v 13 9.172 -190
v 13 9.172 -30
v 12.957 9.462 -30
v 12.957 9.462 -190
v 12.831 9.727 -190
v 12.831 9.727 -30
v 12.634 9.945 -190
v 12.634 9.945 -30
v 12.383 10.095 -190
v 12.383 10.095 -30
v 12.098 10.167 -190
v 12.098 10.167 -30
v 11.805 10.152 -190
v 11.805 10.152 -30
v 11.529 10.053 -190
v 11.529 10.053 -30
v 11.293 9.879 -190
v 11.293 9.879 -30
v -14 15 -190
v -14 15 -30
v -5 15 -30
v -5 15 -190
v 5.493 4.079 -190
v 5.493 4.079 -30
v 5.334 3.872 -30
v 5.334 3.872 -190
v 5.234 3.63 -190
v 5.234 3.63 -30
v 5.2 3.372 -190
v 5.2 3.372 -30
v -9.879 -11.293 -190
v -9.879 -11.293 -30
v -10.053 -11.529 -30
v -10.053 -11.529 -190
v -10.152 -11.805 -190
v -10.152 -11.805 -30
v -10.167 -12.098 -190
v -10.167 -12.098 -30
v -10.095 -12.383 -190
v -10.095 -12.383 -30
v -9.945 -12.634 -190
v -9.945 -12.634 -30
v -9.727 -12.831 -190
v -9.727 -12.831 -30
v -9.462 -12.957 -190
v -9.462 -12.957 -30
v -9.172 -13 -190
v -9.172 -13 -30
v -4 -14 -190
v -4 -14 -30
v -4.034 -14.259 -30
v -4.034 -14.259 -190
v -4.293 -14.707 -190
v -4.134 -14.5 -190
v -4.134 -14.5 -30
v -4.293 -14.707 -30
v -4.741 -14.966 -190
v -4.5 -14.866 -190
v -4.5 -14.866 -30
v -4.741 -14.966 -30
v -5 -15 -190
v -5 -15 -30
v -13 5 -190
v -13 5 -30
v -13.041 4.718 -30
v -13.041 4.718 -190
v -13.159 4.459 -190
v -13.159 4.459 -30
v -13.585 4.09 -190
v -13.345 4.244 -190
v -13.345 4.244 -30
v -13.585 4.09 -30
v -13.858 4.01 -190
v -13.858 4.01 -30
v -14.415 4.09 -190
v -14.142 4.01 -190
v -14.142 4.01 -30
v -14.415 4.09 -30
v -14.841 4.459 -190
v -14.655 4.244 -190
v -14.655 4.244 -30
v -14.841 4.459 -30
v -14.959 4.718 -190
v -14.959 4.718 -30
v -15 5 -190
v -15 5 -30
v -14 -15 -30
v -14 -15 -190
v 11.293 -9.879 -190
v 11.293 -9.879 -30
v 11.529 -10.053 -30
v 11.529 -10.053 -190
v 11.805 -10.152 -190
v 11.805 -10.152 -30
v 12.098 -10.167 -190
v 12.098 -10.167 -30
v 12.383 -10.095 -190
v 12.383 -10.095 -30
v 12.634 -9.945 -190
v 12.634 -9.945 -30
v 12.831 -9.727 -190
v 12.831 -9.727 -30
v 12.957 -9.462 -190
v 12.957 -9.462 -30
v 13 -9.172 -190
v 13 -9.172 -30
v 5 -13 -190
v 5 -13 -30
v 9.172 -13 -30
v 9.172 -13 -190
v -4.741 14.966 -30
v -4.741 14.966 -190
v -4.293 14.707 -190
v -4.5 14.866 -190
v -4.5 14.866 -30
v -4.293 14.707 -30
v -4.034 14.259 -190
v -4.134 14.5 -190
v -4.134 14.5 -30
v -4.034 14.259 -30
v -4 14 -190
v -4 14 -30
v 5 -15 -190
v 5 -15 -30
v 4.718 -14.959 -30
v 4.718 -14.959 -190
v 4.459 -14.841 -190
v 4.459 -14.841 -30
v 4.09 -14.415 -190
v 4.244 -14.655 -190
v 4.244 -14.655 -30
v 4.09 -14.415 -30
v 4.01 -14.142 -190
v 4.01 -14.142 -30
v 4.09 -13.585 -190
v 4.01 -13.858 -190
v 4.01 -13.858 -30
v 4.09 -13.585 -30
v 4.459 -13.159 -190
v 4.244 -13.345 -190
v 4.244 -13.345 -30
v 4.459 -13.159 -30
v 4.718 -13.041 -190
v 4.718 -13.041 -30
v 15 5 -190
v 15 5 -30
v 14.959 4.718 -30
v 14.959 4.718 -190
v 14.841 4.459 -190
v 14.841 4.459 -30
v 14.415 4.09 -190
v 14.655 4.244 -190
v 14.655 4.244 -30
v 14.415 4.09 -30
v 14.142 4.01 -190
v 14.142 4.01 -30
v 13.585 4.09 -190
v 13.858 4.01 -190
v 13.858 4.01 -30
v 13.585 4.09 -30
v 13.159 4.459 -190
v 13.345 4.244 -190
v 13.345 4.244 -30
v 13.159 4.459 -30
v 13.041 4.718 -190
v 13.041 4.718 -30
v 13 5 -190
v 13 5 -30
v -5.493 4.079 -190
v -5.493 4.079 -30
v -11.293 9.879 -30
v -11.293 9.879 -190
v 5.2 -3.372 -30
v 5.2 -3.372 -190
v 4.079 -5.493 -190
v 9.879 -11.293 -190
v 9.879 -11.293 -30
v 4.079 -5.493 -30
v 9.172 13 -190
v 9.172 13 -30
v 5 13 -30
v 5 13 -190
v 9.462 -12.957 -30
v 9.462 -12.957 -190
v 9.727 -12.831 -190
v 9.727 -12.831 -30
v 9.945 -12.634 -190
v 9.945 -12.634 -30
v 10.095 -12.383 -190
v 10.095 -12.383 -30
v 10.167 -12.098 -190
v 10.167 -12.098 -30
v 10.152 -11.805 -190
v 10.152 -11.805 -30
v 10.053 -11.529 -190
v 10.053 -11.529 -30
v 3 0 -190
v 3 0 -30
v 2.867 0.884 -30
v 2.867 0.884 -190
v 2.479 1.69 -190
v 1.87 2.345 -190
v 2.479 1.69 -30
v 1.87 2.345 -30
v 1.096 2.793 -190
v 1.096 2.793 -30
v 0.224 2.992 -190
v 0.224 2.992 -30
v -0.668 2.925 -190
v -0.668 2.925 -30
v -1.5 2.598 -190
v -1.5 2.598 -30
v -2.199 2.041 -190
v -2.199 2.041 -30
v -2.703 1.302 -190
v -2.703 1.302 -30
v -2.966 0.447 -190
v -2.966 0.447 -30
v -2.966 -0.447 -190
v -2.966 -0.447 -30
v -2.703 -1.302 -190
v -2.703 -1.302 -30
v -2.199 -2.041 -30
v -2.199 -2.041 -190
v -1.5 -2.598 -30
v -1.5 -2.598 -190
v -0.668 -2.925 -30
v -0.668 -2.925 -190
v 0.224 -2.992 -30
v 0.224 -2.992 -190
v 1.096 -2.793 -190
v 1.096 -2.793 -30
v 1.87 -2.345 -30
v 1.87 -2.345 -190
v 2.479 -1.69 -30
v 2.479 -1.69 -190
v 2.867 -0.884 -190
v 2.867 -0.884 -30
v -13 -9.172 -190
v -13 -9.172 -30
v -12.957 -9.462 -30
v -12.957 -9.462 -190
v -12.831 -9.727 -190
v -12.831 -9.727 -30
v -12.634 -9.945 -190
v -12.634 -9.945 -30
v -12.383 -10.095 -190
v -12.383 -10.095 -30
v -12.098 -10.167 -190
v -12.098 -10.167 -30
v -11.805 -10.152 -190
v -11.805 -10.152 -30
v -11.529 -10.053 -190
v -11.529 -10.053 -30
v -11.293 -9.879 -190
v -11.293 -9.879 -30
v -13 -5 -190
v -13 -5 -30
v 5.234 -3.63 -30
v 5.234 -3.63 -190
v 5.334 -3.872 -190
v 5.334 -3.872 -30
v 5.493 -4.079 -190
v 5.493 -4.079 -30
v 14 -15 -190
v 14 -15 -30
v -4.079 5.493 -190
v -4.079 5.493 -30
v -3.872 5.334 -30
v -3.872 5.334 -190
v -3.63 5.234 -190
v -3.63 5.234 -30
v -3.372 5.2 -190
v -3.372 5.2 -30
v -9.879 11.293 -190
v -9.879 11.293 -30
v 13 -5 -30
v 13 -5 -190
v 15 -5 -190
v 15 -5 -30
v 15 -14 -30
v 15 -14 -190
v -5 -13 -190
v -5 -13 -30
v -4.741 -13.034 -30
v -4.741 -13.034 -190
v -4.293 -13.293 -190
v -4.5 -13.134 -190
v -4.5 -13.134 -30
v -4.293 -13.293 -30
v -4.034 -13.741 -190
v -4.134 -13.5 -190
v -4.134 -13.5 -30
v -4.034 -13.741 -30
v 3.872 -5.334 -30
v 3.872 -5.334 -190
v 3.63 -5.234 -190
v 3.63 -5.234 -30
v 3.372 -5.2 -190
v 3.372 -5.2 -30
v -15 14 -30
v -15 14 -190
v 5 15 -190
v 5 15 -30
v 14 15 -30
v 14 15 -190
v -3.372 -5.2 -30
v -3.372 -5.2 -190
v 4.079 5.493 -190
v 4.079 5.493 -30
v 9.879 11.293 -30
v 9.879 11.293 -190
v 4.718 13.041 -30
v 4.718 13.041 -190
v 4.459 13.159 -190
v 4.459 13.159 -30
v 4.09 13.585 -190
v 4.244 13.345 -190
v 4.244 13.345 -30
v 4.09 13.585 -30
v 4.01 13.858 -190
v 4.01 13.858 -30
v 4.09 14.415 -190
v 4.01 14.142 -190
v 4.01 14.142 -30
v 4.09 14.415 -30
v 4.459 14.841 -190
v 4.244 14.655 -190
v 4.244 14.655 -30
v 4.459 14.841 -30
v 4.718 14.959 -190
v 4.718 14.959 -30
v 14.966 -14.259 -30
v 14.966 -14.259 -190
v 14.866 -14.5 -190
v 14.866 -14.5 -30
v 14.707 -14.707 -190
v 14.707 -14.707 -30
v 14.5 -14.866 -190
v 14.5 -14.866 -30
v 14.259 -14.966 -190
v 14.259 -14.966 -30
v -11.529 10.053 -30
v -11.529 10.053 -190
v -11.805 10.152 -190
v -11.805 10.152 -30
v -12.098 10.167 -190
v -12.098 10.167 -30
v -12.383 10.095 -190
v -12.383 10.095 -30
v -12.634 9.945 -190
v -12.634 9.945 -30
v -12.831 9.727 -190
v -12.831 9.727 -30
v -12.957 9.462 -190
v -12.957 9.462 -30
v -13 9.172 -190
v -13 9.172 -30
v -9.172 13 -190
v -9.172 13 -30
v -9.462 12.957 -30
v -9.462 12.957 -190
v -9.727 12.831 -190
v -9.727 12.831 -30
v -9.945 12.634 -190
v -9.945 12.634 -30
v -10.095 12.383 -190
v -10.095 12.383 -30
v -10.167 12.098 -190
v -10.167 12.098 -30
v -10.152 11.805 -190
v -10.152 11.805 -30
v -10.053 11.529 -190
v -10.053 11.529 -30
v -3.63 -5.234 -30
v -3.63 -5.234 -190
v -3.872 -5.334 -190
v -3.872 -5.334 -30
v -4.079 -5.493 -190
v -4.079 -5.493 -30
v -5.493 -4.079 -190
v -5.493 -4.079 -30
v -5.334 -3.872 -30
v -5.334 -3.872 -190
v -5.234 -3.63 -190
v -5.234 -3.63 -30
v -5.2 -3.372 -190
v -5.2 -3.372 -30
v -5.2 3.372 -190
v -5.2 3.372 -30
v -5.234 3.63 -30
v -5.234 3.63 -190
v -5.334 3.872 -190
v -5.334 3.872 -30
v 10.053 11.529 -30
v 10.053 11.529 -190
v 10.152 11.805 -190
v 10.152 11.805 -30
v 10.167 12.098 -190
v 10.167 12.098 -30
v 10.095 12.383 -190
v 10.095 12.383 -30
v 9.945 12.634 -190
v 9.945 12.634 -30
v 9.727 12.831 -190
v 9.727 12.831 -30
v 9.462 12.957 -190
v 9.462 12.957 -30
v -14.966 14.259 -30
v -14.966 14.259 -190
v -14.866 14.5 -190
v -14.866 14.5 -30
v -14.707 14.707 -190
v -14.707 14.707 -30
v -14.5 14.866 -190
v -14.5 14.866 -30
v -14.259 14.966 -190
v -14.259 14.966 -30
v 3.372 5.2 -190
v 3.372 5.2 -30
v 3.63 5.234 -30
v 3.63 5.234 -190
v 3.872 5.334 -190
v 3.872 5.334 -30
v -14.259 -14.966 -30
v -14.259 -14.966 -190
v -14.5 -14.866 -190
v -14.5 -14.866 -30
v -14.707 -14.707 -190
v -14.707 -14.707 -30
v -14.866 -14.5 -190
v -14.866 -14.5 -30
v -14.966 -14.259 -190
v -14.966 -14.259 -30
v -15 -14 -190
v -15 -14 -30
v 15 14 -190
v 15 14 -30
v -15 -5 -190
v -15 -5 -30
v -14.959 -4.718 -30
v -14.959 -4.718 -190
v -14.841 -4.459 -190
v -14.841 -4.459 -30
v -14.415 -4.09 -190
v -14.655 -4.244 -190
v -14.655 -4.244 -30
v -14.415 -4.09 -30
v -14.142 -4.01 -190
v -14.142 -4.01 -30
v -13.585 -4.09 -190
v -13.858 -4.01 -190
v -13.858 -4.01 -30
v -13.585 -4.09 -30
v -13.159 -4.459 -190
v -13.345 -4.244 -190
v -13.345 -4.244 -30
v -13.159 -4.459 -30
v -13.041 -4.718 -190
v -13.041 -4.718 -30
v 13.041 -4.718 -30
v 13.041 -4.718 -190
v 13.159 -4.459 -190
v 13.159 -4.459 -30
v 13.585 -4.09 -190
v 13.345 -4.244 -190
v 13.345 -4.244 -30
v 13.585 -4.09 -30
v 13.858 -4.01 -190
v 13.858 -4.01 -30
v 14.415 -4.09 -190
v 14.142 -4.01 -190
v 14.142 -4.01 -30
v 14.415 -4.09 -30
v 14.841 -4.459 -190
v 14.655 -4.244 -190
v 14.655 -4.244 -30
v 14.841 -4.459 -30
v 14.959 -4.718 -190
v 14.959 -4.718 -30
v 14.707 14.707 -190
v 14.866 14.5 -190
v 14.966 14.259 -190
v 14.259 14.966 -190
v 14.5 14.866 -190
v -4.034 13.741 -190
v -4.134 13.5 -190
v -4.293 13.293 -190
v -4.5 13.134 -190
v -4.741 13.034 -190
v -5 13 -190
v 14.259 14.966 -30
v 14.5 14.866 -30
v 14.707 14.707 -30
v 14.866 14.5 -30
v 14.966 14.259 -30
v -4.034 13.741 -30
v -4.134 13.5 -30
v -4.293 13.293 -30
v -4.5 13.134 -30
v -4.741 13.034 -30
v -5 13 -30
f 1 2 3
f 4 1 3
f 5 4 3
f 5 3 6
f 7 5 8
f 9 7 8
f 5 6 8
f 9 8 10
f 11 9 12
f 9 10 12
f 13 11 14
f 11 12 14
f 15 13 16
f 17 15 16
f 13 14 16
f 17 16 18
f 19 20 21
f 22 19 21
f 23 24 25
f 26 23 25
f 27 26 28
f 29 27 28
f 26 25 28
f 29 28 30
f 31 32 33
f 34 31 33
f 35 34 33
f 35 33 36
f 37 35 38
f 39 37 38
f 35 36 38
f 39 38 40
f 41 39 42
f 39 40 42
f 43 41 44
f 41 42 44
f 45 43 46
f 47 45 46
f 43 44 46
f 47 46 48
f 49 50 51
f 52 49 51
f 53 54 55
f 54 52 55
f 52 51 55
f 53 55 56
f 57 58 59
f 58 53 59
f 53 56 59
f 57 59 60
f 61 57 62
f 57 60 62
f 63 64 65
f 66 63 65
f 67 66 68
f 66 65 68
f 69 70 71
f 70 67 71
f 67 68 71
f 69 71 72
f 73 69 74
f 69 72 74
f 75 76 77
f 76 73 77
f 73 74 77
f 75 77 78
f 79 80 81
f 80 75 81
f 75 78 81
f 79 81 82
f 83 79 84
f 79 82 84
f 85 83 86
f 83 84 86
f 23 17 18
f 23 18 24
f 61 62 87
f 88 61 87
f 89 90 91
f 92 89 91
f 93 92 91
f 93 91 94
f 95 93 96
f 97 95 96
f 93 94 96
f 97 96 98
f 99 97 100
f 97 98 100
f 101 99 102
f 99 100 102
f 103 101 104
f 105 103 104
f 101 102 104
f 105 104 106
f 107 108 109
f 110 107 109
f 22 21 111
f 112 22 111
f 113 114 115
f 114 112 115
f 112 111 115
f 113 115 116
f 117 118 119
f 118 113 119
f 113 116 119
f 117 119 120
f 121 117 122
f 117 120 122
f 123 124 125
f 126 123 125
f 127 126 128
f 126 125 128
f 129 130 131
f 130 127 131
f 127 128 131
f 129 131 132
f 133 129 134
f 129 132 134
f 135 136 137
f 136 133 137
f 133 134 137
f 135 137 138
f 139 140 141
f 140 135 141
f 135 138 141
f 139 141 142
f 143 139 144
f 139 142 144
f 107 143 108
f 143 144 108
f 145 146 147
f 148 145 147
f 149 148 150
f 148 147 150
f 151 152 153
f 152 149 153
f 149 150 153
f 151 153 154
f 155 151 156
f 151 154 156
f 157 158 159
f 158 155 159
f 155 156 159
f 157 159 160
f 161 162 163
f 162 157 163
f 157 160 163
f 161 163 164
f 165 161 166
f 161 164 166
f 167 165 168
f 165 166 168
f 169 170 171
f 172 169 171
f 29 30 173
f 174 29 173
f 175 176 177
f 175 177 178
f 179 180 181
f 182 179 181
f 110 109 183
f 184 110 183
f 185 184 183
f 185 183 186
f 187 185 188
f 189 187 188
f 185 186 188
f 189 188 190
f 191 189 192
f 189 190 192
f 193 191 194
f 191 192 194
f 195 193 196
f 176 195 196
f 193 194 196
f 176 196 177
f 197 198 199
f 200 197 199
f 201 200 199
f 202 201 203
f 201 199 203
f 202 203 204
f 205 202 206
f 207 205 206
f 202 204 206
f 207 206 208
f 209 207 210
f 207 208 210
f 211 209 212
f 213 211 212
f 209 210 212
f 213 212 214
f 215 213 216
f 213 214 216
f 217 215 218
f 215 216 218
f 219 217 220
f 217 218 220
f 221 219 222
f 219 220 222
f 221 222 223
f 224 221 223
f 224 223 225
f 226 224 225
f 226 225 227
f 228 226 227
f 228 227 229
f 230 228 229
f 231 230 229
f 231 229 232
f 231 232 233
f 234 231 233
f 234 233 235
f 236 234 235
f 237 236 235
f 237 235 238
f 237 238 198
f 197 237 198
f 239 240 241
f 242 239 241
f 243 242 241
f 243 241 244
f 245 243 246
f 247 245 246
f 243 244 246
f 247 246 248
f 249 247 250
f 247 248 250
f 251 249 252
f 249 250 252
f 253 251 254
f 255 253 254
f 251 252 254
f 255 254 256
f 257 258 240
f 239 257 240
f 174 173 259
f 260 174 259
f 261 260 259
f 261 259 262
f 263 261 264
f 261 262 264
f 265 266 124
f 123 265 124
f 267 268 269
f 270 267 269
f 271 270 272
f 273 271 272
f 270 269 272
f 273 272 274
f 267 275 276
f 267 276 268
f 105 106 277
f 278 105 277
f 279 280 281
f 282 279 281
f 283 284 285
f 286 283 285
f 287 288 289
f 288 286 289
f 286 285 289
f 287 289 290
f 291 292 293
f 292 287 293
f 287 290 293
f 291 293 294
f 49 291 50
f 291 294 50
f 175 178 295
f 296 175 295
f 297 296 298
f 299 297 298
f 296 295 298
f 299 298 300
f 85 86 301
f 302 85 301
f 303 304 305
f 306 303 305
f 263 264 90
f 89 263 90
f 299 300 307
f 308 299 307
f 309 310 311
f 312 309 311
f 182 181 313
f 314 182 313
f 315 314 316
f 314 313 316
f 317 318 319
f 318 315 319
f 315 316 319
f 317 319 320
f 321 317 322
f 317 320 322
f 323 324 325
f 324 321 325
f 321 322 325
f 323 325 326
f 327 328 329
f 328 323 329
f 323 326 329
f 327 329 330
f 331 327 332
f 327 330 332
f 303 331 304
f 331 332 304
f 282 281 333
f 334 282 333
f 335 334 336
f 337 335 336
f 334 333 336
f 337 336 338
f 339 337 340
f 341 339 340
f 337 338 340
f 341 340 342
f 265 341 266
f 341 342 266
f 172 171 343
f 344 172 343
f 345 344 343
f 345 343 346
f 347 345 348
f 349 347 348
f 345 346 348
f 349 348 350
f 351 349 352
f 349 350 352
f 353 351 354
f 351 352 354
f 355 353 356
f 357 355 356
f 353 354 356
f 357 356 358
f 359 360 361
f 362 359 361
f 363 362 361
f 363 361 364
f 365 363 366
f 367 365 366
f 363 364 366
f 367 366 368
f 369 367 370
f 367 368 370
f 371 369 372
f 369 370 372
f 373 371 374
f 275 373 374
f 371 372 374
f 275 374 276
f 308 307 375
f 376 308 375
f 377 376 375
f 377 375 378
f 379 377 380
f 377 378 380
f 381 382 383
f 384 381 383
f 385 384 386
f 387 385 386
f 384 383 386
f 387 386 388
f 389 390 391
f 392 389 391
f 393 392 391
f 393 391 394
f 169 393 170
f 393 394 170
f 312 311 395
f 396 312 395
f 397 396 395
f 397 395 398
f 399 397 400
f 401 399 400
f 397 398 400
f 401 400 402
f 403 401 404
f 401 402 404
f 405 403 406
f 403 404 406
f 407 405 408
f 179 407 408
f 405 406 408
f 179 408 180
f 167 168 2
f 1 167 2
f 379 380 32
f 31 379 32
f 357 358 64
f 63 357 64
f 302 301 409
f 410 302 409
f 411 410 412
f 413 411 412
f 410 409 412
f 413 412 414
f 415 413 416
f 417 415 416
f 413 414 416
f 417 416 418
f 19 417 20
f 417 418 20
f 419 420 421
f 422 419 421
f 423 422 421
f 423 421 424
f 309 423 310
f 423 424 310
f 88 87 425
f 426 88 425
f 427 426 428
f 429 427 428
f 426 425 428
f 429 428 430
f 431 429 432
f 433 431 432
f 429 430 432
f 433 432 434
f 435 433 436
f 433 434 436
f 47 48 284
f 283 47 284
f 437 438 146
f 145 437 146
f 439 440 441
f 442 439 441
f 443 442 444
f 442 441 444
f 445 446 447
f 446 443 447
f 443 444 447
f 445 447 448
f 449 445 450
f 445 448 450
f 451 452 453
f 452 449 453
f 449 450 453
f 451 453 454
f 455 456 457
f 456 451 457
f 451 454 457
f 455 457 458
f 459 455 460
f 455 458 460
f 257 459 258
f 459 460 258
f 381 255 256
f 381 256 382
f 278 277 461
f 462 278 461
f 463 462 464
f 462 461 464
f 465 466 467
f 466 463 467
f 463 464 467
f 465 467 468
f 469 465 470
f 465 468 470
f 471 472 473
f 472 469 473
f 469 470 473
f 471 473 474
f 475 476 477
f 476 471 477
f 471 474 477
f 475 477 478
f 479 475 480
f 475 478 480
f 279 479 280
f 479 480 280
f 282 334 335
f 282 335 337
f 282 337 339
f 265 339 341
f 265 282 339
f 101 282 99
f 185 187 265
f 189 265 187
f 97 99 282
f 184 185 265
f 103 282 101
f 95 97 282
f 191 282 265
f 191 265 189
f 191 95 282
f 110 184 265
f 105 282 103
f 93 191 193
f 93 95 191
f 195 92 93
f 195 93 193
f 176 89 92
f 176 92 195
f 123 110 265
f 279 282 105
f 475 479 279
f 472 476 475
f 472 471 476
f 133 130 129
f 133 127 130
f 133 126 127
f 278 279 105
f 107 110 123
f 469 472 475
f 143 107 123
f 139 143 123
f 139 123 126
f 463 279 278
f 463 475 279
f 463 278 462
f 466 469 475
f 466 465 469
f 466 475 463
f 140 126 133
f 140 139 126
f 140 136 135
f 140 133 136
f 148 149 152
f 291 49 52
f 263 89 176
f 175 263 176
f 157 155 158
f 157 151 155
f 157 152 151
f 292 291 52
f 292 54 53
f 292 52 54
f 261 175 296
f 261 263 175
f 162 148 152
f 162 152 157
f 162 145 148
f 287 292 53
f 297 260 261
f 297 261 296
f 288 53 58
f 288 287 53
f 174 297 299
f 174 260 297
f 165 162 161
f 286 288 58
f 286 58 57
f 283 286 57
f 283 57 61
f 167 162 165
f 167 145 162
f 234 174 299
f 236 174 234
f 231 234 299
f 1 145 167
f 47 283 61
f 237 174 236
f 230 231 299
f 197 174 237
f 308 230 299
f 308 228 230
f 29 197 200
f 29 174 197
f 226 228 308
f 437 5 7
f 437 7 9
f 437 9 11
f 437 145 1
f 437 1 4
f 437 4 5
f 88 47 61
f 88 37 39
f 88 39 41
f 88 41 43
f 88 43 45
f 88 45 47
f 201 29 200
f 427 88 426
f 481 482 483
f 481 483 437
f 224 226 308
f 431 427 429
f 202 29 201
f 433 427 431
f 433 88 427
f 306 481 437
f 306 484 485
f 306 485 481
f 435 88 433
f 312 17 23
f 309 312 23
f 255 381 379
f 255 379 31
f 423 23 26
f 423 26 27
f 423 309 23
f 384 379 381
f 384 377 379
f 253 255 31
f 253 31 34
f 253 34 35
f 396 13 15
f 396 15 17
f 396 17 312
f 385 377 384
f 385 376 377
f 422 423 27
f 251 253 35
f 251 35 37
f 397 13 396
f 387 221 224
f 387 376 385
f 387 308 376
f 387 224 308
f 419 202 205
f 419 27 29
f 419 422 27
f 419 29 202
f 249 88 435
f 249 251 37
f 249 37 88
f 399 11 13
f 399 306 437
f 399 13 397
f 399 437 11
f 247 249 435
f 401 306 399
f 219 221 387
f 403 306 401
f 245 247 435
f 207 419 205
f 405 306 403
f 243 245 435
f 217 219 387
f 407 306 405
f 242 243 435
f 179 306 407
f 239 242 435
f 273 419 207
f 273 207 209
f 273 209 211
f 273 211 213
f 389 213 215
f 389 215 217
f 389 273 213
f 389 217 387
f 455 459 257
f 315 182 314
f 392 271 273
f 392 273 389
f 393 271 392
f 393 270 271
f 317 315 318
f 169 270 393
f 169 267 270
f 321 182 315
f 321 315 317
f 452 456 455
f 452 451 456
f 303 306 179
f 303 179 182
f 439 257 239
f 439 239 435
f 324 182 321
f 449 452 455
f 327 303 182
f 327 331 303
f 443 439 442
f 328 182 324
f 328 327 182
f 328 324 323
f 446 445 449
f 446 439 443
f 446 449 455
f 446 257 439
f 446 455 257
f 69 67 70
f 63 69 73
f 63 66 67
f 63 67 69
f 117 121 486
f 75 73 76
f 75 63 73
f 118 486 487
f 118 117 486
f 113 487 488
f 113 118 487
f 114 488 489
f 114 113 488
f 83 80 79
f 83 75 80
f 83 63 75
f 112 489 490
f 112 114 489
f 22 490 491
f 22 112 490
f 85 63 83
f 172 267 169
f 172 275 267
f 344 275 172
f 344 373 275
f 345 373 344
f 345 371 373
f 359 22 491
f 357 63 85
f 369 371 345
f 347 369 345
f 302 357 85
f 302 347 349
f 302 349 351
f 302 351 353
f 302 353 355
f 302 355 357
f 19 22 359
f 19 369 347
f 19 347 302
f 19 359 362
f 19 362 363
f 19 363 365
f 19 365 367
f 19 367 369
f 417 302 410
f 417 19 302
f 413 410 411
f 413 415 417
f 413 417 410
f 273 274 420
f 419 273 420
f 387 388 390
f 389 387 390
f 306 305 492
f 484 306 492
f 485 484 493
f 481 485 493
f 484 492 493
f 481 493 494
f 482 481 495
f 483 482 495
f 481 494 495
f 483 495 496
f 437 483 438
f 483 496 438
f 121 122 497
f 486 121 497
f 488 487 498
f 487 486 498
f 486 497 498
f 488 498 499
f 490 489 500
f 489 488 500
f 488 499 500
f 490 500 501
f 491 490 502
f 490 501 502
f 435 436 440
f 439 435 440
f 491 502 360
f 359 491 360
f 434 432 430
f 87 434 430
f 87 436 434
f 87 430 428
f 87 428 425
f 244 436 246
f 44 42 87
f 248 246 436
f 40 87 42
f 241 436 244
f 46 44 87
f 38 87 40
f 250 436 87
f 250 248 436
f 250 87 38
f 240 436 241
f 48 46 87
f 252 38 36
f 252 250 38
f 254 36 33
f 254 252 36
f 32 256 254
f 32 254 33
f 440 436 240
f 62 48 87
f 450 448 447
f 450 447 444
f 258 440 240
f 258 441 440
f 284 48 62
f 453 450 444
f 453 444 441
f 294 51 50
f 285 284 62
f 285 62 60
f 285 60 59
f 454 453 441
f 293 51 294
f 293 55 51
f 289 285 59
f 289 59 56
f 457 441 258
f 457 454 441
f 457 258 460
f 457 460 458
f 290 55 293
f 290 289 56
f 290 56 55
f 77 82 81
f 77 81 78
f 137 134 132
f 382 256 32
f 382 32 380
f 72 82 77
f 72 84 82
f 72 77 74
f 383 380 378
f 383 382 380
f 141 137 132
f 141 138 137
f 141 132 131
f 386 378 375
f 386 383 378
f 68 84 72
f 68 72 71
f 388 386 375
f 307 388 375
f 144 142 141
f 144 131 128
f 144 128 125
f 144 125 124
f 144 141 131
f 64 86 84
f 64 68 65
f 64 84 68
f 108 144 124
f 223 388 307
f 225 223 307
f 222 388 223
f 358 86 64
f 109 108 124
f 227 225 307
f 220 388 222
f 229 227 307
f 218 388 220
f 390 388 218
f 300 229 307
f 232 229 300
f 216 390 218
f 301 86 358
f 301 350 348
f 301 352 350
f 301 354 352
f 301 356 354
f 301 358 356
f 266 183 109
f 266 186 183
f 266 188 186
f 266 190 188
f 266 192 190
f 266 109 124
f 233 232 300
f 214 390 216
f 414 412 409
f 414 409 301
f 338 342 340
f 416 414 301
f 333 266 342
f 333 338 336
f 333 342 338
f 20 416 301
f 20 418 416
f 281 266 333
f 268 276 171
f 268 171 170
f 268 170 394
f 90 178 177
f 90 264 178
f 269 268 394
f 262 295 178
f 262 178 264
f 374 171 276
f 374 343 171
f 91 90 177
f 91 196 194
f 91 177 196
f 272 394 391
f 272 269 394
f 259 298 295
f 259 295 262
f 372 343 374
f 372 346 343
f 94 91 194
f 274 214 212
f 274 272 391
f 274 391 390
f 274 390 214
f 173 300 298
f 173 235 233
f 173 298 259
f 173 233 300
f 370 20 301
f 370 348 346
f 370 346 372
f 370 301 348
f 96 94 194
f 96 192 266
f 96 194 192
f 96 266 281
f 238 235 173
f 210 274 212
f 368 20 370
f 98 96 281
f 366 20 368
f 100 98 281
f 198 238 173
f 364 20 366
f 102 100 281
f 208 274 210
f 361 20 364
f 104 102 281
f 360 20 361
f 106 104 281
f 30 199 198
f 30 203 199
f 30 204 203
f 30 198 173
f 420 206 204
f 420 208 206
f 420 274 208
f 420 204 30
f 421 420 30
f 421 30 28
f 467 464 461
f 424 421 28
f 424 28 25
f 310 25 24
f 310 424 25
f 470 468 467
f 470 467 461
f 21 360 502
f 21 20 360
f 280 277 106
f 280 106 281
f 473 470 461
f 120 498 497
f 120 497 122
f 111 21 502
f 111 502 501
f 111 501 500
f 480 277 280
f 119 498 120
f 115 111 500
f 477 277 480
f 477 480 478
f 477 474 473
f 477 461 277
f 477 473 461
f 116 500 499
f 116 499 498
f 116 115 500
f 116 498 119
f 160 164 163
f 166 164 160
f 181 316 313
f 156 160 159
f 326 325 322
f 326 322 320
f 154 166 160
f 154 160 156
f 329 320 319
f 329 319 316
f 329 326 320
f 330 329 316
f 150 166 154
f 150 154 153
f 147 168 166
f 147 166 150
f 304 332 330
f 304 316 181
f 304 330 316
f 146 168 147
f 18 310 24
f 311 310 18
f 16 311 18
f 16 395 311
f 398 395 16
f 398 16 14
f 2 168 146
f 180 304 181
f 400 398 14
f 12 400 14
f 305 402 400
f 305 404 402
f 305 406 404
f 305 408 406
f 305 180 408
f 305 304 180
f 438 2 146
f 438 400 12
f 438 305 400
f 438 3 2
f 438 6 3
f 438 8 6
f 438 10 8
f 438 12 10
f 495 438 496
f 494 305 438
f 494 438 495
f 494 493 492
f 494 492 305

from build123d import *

# Parameters (mm, degrees)
SALIENTE_EXTRUIR1_DEPTH = 190
CROQUIS2_R              = 3
CORTAR_EXTRUIR1_DEPTH   = 192.180542943
CORTAR_EXTRUIR3_DEPTH   = 192.180542943
CROQUIS4_W              = 33.127581221
CROQUIS4_H              = 30
CORTAR_EXTRUIR4_DEPTH   = 38


with BuildPart() as part:
    # Croquis1 → Saliente-Extruir1 (new body)
    with BuildSketch(Plane.XY):
        with BuildLine():
            Line((-14, 15), (14, 15))
            ThreePointArc((14, 15), (14.707106781, 14.707106781), (15, 14))
            Line((15, 14), (15, -14))
            ThreePointArc((15, -14), (14.707106781, -14.707106781), (14, -15))
            Line((14, -15), (-14, -15))
            ThreePointArc((-14, -15), (-14.707106781, -14.707106781), (-15, -14))
            Line((-15, -14), (-15, 14))
            ThreePointArc((-15, 14), (-14.707106781, 14.707106781), (-14, 15))
        make_face()
    extrude(amount=-SALIENTE_EXTRUIR1_DEPTH)

    # Croquis2 → Cortar-Extruir1 (cut, through all)
    with BuildSketch(Plane.XY):
        Circle(CROQUIS2_R)
    extrude(amount=-CORTAR_EXTRUIR1_DEPTH, mode=Mode.SUBTRACT)

    # Croquis3 → Cortar-Extruir3 (cut, through all)
    with BuildSketch(Plane.XY):
        with BuildLine():
            Line((-5.492893219, 4.078679656), (-11.292893219, 9.878679656))
            ThreePointArc((-11.292893219, 9.878679656), (-12.382683432, 10.095452408), (-13, 9.171572875))
            Line((-13, 9.171572875), (-13, 5))
            ThreePointArc((-13, 5), (-14, 4), (-15, 5))
            Line((-15, 5), (-15, -5))
            ThreePointArc((-15, -5), (-14, -4), (-13, -5))
            Line((-13, -5), (-13, -9.171572875))
            ThreePointArc((-13, -9.171572875), (-12.382683432, -10.095452408), (-11.292893219, -9.878679656))
            Line((-11.292893219, -9.878679656), (-5.492893219, -4.078679656))
            ThreePointArc((-5.492893219, -4.078679656), (-5.276120467, -3.754256308), (-5.2, -3.371572875))
            Line((-5.2, -3.371572875), (-5.2, 3.371572875))
            ThreePointArc((-5.2, 3.371572875), (-5.276120467, 3.754256308), (-5.492893219, 4.078679656))
        make_face()
        with BuildLine():
            ThreePointArc((-9.171572875, 13), (-10.095452408, 12.382683432), (-9.878679656, 11.292893219))
            Line((-9.878679656, 11.292893219), (-4.078679656, 5.492893219))
            ThreePointArc((-4.078679656, 5.492893219), (-3.754256308, 5.276120467), (-3.371572875, 5.2))
            Line((-3.371572875, 5.2), (3.371572875, 5.2))
            ThreePointArc((3.371572875, 5.2), (3.754256308, 5.276120467), (4.078679656, 5.492893219))
            Line((4.078679656, 5.492893219), (9.878679656, 11.292893219))
            ThreePointArc((9.878679656, 11.292893219), (10.095452408, 12.382683432), (9.171572875, 13))
            Line((9.171572875, 13), (5, 13))
            ThreePointArc((5, 13), (4, 14), (5, 15))
            Line((5, 15), (-5, 15))
            ThreePointArc((-5, 15), (-4.292893219, 14.707106781), (-4, 14))
            ThreePointArc((-4, 14), (-4.292893219, 13.292893219), (-5, 13))
            Line((-5, 13), (-9.171572875, 13))
        make_face()
        with BuildLine():
            Line((9.878679656, -11.292893219), (4.078679656, -5.492893219))
            ThreePointArc((4.078679656, -5.492893219), (3.754256308, -5.276120467), (3.371572875, -5.2))
            Line((3.371572875, -5.2), (-3.371572875, -5.2))
            ThreePointArc((-3.371572875, -5.2), (-3.754256308, -5.276120467), (-4.078679656, -5.492893219))
            Line((-4.078679656, -5.492893219), (-9.878679656, -11.292893219))
            ThreePointArc((-9.878679656, -11.292893219), (-10.095452408, -12.382683432), (-9.171572875, -13))
            Line((-9.171572875, -13), (-5, -13))
            ThreePointArc((-5, -13), (-4.292893219, -13.292893219), (-4, -14))
            ThreePointArc((-4, -14), (-4.292893219, -14.707106781), (-5, -15))
            Line((-5, -15), (5, -15))
            ThreePointArc((5, -15), (4, -14), (5, -13))
            Line((5, -13), (9.171572875, -13))
            ThreePointArc((9.171572875, -13), (10.095452408, -12.382683432), (9.878679656, -11.292893219))
        make_face()
        with BuildLine():
            ThreePointArc((13, 9.171572875), (12.382683432, 10.095452408), (11.292893219, 9.878679656))
            Line((11.292893219, 9.878679656), (5.492893219, 4.078679656))
            ThreePointArc((5.492893219, 4.078679656), (5.276120467, 3.754256308), (5.2, 3.371572875))
            Line((5.2, 3.371572875), (5.2, -3.371572875))
            ThreePointArc((5.2, -3.371572875), (5.276120467, -3.754256308), (5.492893219, -4.078679656))
            Line((5.492893219, -4.078679656), (11.292893219, -9.878679656))
            ThreePointArc((11.292893219, -9.878679656), (12.382683432, -10.095452408), (13, -9.171572875))
            Line((13, -9.171572875), (13, -5))
            ThreePointArc((13, -5), (14, -4), (15, -5))
            Line((15, -5), (15, 5))
            ThreePointArc((15, 5), (14, 4), (13, 5))
            Line((13, 5), (13, 9.171572875))
        make_face()
    extrude(amount=-CORTAR_EXTRUIR3_DEPTH, mode=Mode.SUBTRACT)

    # Croquis4 → Cortar-Extruir4 (cut)
    with BuildSketch(Plane(origin=(0, 15, 0), x_dir=(1, 0, 0), z_dir=(0, 1, 0))):
        with Locations((-1.56379061, 15)):
            Rectangle(CROQUIS4_W, CROQUIS4_H)
    extrude(amount=-CORTAR_EXTRUIR4_DEPTH, mode=Mode.SUBTRACT)


solid = part.part
